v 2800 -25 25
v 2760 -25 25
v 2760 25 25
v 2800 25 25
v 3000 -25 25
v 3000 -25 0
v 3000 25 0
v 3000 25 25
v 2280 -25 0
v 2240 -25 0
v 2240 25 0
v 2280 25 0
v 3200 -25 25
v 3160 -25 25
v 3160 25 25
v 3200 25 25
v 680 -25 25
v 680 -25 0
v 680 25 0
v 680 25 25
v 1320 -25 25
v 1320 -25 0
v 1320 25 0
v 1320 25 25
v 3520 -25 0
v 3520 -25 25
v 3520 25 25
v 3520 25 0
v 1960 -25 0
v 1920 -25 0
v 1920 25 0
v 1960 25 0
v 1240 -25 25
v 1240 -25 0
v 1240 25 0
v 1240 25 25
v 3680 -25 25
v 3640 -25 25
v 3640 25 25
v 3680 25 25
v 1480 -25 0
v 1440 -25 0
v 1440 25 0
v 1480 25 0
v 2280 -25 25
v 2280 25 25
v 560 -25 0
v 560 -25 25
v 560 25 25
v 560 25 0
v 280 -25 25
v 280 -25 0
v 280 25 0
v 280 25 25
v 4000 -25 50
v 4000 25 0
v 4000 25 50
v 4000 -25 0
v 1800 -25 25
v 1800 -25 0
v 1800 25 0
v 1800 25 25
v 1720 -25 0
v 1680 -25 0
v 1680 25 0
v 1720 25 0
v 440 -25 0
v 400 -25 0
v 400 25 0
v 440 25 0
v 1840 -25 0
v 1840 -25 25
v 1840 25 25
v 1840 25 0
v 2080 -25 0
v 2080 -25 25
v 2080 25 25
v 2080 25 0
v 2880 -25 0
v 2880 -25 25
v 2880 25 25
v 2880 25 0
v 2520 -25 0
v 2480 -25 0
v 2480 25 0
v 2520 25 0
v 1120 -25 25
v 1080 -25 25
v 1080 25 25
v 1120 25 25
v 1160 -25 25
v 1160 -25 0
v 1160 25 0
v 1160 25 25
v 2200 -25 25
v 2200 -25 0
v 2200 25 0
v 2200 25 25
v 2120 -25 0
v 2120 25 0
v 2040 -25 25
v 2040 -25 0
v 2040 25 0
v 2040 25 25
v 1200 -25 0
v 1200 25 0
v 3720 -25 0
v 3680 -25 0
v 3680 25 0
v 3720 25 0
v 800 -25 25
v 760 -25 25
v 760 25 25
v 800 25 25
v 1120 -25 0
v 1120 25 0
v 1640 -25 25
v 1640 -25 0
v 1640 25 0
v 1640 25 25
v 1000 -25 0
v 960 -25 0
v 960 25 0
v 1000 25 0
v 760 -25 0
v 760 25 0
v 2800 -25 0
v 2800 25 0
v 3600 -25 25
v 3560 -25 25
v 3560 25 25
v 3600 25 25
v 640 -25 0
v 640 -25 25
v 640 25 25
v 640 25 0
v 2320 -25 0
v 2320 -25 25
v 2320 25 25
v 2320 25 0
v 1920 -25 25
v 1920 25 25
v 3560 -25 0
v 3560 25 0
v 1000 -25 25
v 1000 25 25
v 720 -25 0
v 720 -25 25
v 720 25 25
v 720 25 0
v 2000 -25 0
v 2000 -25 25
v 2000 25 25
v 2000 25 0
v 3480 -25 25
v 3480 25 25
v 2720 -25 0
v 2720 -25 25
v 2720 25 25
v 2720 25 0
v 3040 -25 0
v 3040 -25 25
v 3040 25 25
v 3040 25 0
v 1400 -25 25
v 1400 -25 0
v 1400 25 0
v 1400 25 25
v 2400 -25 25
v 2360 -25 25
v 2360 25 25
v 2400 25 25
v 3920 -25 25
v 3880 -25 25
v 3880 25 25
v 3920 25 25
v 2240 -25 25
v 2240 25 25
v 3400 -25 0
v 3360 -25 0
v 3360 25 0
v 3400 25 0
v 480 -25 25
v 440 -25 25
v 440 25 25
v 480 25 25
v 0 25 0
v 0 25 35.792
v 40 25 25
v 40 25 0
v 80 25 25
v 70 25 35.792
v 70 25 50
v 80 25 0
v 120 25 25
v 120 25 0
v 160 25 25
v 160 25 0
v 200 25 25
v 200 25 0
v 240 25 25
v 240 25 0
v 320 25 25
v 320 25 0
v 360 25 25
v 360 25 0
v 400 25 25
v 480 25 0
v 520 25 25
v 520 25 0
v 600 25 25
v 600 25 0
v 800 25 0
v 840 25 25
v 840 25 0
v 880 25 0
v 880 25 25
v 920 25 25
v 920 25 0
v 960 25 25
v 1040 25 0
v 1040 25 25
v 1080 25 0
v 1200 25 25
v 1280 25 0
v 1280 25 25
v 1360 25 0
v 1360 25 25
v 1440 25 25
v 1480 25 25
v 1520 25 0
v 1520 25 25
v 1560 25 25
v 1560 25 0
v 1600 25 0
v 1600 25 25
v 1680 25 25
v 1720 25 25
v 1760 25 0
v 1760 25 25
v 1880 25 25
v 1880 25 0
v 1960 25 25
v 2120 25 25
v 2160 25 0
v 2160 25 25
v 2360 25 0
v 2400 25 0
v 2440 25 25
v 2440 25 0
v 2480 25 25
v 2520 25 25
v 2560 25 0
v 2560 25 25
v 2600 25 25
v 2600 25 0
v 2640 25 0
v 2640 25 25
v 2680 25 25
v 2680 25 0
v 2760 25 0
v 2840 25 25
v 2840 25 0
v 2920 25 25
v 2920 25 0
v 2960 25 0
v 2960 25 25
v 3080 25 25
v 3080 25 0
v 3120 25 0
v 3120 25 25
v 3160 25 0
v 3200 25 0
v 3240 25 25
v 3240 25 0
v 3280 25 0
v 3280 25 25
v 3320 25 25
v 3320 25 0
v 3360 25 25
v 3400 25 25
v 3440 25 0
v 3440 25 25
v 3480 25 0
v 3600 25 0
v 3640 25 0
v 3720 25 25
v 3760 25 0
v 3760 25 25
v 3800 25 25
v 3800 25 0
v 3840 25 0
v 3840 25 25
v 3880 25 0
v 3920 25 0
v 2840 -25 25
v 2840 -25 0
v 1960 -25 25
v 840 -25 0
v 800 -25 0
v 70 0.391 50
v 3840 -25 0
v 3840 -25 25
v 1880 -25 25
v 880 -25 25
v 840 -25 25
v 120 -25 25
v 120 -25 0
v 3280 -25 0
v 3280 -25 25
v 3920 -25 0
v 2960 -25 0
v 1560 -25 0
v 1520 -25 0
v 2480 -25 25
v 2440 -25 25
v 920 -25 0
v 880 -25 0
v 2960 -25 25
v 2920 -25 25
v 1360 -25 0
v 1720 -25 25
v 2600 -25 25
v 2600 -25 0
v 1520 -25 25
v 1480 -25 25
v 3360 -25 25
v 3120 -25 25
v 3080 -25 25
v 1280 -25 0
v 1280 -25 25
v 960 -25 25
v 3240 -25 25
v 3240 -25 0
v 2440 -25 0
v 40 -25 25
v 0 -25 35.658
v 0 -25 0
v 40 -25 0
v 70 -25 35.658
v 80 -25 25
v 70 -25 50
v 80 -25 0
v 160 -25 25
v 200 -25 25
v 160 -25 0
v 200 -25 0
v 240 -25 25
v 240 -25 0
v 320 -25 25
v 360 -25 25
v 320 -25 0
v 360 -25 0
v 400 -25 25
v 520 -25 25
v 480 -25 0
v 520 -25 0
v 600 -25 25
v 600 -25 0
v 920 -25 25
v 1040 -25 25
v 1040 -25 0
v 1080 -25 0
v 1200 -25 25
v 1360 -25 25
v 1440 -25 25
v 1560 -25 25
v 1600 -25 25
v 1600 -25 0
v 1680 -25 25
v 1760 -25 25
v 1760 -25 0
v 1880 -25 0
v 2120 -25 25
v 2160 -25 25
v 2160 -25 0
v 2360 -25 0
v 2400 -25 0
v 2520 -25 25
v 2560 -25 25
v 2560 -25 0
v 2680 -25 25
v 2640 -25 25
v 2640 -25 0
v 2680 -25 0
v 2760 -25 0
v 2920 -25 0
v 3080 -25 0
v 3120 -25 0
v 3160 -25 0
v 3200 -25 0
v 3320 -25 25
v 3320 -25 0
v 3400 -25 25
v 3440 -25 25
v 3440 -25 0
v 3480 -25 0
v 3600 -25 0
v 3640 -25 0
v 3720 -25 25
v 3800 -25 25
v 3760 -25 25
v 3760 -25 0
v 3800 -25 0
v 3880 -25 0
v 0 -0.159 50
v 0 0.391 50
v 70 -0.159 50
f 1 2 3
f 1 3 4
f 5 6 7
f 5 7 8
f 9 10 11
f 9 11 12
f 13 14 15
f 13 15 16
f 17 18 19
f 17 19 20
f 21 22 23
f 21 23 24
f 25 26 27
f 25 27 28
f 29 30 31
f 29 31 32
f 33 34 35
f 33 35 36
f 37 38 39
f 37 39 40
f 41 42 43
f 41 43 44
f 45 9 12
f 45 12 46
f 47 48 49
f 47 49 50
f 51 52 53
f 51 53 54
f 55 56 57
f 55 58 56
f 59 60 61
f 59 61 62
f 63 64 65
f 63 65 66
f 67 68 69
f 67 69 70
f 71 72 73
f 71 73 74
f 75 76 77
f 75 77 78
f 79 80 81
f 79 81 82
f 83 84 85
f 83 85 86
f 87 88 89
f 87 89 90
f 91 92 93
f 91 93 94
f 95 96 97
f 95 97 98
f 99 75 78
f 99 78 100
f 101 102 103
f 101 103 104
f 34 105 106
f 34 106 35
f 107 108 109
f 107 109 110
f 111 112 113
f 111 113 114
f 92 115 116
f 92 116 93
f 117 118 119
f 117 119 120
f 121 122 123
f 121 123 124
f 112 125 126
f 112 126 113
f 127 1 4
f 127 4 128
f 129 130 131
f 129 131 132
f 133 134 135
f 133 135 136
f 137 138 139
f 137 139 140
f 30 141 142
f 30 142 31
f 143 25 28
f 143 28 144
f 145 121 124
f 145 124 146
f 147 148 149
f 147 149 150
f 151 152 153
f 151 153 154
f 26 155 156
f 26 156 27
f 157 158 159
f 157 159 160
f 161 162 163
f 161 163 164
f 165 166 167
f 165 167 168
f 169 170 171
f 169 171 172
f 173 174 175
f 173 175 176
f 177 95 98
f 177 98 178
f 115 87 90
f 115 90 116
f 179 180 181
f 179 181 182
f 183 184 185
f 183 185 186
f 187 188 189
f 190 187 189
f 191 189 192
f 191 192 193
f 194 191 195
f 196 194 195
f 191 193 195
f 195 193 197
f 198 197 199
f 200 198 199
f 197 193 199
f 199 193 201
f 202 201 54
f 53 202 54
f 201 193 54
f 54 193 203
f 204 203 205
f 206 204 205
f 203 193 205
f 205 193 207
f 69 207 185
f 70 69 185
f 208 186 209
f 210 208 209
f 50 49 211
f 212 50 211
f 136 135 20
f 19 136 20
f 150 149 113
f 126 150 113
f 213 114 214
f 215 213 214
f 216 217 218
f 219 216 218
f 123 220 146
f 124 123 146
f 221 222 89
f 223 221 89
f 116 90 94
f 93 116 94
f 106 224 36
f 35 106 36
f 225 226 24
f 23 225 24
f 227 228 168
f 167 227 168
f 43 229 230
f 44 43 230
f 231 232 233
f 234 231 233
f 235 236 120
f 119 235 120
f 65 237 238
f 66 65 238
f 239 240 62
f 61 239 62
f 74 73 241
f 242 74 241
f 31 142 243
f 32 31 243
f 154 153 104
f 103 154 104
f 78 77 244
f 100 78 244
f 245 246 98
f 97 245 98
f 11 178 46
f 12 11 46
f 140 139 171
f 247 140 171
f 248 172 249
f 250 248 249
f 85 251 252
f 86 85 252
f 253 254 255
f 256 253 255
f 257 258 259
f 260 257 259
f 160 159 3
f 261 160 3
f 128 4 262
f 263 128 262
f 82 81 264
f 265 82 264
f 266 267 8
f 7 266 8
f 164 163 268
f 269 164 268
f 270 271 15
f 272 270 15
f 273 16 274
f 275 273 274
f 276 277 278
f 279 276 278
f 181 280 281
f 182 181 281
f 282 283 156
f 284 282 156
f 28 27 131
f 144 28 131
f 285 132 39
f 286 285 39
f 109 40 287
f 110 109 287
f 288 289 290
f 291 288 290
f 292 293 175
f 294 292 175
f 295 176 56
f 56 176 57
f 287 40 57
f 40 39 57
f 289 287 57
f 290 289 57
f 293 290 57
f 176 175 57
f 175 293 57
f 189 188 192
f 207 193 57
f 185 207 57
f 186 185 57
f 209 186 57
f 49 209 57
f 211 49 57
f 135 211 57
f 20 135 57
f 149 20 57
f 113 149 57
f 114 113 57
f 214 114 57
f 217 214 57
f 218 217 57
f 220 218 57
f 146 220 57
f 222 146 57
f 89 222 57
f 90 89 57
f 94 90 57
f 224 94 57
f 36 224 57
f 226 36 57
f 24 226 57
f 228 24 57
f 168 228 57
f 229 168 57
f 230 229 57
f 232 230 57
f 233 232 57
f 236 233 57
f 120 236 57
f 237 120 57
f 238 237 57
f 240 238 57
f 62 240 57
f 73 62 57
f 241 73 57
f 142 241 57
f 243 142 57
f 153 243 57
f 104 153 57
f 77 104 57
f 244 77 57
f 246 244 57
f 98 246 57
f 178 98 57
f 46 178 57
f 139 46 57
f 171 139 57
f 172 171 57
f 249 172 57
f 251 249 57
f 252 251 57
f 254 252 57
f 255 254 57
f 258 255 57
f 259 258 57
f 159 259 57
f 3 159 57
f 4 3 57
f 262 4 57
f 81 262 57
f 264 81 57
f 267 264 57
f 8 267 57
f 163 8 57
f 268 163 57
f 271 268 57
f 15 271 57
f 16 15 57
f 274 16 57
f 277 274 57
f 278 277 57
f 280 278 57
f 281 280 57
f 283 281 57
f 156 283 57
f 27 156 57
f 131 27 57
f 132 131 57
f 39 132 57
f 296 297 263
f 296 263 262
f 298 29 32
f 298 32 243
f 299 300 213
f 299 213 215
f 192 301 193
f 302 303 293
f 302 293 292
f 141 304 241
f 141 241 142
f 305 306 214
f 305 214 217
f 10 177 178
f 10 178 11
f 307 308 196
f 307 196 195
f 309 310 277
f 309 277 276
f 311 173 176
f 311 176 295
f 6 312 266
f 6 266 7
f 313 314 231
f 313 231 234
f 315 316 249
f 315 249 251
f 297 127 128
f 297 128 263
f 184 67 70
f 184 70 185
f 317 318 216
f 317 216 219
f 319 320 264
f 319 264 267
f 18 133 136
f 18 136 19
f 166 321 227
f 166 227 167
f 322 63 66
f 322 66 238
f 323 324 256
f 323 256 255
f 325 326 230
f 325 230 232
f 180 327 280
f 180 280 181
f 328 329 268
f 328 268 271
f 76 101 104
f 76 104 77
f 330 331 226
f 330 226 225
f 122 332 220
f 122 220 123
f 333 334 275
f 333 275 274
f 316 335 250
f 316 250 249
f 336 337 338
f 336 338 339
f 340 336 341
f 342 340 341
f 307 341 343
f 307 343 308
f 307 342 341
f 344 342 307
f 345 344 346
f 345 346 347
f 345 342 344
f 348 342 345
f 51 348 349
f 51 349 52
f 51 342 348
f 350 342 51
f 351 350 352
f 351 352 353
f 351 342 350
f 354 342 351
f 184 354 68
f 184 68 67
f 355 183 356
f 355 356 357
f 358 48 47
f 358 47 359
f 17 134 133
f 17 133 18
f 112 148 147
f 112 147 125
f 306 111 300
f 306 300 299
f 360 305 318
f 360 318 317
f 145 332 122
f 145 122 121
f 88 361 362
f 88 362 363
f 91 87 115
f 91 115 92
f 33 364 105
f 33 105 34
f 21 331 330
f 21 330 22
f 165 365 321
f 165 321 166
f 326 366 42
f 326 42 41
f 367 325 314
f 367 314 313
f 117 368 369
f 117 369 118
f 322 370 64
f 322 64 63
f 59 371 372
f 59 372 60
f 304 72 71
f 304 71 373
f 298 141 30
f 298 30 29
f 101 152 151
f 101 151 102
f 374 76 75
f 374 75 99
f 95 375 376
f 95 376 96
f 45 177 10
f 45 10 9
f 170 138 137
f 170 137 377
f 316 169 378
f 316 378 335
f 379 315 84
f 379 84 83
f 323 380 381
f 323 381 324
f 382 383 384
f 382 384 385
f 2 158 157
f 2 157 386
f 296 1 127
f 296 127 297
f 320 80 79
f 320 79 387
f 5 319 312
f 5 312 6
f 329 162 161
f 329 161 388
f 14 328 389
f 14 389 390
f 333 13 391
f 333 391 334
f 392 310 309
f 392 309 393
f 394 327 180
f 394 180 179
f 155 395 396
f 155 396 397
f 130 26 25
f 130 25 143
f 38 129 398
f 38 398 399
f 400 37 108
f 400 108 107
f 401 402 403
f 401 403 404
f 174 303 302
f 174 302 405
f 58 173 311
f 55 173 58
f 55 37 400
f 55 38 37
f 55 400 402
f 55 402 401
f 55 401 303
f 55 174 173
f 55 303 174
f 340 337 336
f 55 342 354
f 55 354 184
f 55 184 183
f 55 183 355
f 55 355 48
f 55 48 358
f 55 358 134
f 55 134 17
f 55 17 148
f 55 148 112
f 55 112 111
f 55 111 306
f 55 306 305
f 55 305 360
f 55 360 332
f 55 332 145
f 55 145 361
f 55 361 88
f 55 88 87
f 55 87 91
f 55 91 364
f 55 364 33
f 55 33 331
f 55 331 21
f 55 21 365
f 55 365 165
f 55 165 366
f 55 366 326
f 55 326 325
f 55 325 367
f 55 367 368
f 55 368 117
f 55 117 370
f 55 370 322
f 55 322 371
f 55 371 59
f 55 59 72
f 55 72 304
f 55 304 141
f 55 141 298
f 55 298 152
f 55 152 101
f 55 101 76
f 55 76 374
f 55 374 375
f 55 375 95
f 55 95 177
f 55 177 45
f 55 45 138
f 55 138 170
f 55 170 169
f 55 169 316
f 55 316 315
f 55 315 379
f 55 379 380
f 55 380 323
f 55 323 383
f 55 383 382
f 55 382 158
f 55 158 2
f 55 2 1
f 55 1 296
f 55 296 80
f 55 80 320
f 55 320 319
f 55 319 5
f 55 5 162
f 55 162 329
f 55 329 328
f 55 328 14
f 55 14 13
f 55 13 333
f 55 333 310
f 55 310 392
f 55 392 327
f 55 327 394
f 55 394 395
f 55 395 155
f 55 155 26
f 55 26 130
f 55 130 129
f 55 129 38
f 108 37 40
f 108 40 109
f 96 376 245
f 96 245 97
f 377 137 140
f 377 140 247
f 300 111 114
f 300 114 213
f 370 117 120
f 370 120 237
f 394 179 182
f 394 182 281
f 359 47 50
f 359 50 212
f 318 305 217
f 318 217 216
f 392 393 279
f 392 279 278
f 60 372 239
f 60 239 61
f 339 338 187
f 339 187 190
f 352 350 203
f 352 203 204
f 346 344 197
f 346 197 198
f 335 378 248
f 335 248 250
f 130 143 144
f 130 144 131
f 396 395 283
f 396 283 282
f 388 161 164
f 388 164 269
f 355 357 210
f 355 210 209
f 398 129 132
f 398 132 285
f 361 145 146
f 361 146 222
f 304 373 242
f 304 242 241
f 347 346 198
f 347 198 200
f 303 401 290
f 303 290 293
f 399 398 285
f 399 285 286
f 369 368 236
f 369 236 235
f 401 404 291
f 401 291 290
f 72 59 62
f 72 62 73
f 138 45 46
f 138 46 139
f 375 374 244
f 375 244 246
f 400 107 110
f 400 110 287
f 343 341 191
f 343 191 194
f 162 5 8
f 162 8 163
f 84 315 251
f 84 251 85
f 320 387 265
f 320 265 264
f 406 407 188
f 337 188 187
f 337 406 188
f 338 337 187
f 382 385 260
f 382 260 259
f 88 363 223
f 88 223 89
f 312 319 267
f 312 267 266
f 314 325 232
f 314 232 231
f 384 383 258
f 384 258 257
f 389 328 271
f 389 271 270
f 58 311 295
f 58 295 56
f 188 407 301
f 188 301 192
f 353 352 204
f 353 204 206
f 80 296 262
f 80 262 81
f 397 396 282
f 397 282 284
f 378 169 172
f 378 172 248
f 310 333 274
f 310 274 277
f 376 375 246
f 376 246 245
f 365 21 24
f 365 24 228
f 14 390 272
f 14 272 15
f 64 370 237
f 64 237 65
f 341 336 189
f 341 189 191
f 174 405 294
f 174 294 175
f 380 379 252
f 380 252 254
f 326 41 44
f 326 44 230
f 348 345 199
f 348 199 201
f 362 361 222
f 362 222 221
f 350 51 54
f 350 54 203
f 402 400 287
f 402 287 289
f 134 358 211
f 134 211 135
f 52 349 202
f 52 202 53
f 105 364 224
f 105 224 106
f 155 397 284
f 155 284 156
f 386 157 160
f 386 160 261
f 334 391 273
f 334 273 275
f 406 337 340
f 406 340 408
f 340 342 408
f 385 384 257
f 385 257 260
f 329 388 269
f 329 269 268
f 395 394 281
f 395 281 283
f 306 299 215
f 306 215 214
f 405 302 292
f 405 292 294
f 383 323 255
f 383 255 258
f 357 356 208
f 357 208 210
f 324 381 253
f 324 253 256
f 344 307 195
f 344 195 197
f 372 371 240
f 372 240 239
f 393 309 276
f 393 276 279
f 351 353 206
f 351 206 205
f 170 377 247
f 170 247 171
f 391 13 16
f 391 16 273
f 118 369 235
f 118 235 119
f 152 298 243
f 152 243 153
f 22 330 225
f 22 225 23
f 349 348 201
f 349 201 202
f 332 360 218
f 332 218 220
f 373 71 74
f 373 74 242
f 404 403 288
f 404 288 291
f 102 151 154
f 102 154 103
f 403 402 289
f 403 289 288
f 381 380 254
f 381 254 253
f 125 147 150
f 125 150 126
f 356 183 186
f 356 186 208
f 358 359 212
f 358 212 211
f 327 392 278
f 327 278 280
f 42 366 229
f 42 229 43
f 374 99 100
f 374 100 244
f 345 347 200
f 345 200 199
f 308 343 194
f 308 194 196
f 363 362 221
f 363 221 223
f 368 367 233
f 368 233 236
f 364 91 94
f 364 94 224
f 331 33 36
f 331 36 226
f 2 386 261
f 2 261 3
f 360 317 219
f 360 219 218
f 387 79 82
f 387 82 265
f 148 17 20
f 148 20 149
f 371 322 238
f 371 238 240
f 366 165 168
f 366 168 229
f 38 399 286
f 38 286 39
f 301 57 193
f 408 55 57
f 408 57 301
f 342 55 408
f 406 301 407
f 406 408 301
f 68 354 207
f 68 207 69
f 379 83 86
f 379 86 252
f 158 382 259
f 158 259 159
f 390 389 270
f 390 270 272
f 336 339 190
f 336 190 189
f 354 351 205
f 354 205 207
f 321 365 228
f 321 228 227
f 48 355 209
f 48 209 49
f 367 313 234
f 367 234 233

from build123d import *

# Parameters (mm, degrees)
F1_DEPTH = 25
F3_DEPTH = 70


with BuildPart() as f1:
    # F0 (on Front) → F1 (new body, symmetric)
    with BuildSketch(Plane.XZ):
        Polygon((0, 50), (0, 0), (40, 0), (40, 25), (80, 25), (80, 0), (120, 0), (120, 25), (160, 25), (160, 0), (200, 0), (200, 25), (240, 25), (240, 0), (280, 0), (280, 25), (320, 25), (320, 0), (360, 0), (360, 25), (400, 25), (400, 0), (440, 0), (440, 25), (480, 25), (480, 0), (520, 0), (520, 25), (560, 25), (560, 0), (600, 0), (600, 25), (640, 25), (640, 0), (680, 0), (680, 25), (720, 25), (720, 0), (760, 0), (760, 25), (800, 25), (800, 0), (840, 0), (840, 25), (880, 25), (880, 0), (920, 0), (920, 25), (960, 25), (960, 0), (1000, 0), (1000, 25), (1040, 25), (1040, 0), (1080, 0), (1080, 25), (1120, 25), (1120, 0), (1160, 0), (1160, 25), (1200, 25), (1200, 0), (1240, 0), (1240, 25), (1280, 25), (1280, 0), (1320, 0), (1320, 25), (1360, 25), (1360, 0), (1400, 0), (1400, 25), (1440, 25), (1440, 0), (1480, 0), (1480, 25), (1520, 25), (1520, 0), (1560, 0), (1560, 25), (1600, 25), (1600, 0), (1640, 0), (1640, 25), (1680, 25), (1680, 0), (1720, 0), (1720, 25), (1760, 25), (1760, 0), (1800, 0), (1800, 25), (1840, 25), (1840, 0), (1880, 0), (1880, 25), (1920, 25), (1920, 0), (1960, 0), (1960, 25), (2000, 25), (2000, 0), (2040, 0), (2040, 25), (2080, 25), (2080, 0), (2120, 0), (2120, 25), (2160, 25), (2160, 0), (2200, 0), (2200, 25), (2240, 25), (2240, 0), (2280, 0), (2280, 25), (2320, 25), (2320, 0), (2360, 0), (2360, 25), (2400, 25), (2400, 0), (2440, 0), (2440, 25), (2480, 25), (2480, 0), (2520, 0), (2520, 25), (2560, 25), (2560, 0), (2600, 0), (2600, 25), (2640, 25), (2640, 0), (2680, 0), (2680, 25), (2720, 25), (2720, 0), (2760, 0), (2760, 25), (2800, 25), (2800, 0), (2840, 0), (2840, 25), (2880, 25), (2880, 0), (2920, 0), (2920, 25), (2960, 25), (2960, 0), (3000, 0), (3000, 25), (3040, 25), (3040, 0), (3080, 0), (3080, 25), (3120, 25), (3120, 0), (3160, 0), (3160, 25), (3200, 25), (3200, 0), (3240, 0), (3240, 25), (3280, 25), (3280, 0), (3320, 0), (3320, 25), (3360, 25), (3360, 0), (3400, 0), (3400, 25), (3440, 25), (3440, 0), (3480, 0), (3480, 25), (3520, 25), (3520, 0), (3560, 0), (3560, 25), (3600, 25), (3600, 0), (3640, 0), (3640, 25), (3680, 25), (3680, 0), (3720, 0), (3720, 25), (3760, 25), (3760, 0), (3800, 0), (3800, 25), (3840, 25), (3840, 0), (3880, 0), (3880, 25), (3920, 25), (3920, 0), (4000, 0), (4000, 50), align=None)
    extrude(amount=F1_DEPTH, both=True)

    # F2 (on Right) → F3 (cut)
    with BuildSketch(Plane.YZ):
        Polygon((-25.124032, 50.158735), (-25.124032, 35.586163), (0, 50.091529), (0, 50.158735), align=None)
        Polygon((25.35684, 50.158735), (0.116404, 50.158735), (25.35684, 35.586163), align=None)
    extrude(amount=F3_DEPTH, mode=Mode.SUBTRACT)


solid = f1.part
